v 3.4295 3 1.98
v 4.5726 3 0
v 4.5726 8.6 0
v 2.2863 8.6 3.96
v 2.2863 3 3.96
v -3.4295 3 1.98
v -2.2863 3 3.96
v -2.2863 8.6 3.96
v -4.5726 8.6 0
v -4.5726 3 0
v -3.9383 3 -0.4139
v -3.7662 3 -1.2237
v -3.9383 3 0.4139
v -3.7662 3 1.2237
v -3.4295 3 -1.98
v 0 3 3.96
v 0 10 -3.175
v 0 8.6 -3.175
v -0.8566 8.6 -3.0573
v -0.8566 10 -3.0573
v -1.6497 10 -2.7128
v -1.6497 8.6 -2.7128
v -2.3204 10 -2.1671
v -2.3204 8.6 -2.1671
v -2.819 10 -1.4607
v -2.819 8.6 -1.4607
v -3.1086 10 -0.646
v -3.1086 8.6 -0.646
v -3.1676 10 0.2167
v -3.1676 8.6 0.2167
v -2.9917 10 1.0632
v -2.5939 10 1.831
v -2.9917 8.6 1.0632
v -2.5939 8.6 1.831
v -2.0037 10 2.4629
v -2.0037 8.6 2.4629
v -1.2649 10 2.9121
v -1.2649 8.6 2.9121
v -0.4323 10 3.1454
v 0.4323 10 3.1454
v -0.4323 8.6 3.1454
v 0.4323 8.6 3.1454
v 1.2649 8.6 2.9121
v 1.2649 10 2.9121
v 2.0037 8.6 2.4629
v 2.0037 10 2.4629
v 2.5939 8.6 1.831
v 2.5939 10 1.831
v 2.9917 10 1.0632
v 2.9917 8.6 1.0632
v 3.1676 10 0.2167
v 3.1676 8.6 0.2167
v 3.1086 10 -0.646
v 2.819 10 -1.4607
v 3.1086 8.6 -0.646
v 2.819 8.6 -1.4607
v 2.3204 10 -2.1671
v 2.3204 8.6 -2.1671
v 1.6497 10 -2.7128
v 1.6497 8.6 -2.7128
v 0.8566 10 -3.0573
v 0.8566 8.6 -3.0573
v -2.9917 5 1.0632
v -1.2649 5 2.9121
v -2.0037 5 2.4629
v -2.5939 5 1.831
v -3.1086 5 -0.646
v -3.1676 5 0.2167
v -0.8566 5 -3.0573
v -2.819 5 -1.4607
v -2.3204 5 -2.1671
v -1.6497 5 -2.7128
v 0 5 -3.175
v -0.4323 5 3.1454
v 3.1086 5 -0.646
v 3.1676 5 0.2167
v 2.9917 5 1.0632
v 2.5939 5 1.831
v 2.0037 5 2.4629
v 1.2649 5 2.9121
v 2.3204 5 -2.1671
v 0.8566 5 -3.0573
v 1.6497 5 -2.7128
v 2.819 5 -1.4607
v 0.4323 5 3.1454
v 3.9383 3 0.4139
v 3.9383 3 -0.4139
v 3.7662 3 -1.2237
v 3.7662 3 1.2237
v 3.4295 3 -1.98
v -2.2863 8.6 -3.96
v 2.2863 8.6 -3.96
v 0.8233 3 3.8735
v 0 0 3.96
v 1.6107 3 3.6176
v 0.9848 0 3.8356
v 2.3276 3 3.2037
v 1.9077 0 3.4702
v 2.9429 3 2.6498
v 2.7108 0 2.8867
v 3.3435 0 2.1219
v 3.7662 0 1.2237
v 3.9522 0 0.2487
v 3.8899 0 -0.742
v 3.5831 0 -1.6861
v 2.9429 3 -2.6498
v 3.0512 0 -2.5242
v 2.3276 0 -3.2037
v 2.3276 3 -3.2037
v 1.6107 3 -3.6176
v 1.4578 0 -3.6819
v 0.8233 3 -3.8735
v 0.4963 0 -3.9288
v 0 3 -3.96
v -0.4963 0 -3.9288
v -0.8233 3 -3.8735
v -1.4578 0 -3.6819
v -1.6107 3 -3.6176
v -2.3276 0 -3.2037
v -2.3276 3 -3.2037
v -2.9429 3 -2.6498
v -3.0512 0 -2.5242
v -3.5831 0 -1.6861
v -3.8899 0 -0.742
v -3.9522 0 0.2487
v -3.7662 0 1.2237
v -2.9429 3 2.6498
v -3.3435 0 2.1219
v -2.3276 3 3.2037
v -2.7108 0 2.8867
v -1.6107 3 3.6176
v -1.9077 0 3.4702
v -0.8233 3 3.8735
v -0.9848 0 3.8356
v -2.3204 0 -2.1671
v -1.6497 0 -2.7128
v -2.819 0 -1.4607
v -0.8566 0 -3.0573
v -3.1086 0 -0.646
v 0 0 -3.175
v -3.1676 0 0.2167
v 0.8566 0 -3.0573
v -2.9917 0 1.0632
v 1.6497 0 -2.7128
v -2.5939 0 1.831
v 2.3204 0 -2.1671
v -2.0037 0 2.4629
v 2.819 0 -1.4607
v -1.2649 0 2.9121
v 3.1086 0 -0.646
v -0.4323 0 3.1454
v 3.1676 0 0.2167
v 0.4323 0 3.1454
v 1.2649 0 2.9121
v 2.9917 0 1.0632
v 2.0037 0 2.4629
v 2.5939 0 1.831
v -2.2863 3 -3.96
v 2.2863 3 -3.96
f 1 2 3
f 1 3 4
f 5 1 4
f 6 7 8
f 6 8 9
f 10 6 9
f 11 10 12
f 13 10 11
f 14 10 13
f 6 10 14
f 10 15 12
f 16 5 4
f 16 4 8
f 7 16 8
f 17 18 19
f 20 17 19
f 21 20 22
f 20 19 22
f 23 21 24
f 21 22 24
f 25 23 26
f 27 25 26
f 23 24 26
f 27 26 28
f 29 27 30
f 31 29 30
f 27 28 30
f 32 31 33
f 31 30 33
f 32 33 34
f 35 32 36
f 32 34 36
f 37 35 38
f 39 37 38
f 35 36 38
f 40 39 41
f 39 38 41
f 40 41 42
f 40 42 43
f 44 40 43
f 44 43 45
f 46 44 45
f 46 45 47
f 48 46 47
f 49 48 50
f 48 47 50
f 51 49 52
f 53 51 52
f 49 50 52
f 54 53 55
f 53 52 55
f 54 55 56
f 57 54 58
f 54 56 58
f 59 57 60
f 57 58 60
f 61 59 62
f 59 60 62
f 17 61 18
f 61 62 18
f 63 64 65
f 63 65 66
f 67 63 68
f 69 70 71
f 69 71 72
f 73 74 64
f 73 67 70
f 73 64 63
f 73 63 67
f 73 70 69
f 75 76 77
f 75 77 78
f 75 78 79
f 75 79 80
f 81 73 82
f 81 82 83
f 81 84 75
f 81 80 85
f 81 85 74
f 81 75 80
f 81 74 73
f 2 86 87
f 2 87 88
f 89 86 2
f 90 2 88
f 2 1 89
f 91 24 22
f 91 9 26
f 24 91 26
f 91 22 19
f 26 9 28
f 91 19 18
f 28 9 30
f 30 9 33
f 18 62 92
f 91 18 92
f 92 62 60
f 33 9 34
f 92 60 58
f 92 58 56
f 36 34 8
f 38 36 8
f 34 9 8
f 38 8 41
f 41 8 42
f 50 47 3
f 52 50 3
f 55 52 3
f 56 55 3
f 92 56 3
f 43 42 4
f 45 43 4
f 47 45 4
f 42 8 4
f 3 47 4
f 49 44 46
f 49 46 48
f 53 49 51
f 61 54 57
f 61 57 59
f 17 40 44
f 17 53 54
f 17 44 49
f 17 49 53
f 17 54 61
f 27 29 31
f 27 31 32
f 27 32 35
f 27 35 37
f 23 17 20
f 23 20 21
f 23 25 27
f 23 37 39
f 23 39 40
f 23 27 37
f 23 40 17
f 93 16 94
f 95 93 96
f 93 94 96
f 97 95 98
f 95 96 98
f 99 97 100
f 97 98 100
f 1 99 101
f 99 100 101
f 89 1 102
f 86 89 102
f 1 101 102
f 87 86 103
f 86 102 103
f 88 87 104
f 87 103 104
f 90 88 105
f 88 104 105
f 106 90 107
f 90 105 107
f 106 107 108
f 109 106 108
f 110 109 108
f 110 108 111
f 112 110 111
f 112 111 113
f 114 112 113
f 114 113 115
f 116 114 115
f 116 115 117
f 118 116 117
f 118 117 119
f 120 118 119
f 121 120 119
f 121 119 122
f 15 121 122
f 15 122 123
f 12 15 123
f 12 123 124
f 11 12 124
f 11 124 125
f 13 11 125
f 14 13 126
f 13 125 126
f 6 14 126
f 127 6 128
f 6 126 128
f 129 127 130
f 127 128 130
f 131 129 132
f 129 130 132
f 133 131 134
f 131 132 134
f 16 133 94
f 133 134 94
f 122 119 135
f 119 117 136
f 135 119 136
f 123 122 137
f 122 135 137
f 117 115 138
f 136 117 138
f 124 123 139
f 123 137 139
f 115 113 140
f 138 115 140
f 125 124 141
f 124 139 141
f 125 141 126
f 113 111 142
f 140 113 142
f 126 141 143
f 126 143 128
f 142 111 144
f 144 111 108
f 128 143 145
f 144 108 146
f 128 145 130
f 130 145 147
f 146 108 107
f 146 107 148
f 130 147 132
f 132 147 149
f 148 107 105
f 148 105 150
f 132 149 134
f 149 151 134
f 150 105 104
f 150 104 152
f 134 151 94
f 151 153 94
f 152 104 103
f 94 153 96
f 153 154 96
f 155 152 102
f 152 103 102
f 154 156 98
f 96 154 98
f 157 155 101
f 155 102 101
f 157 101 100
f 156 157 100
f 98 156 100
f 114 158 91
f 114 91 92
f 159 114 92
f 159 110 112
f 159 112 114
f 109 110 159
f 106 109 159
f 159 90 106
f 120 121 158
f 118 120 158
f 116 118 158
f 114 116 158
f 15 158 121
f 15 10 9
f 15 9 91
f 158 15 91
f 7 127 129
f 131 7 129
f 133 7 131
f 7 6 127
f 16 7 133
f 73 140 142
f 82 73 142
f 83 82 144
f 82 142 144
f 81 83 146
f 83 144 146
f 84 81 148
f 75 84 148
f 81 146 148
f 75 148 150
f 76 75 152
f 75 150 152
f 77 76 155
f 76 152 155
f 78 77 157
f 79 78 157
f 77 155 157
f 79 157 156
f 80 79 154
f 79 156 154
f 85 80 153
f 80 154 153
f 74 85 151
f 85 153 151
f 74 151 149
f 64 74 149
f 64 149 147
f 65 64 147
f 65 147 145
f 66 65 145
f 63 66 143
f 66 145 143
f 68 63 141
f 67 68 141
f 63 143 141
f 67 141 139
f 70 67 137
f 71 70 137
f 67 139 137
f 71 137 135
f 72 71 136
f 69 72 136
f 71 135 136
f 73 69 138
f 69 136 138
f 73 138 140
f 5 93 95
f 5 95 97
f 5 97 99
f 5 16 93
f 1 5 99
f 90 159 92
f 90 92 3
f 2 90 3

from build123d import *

# Parameters (mm, degrees)
SKETCH5_R           = 3.96
BOSS_EXTRUDE5_DEPTH = 3
BOSS_EXTRUDE7_DEPTH = 5.6
SKETCH7_R           = 3.175
CUT_EXTRUDE1_DEPTH  = 5
SKETCH8_R           = 3.175
BOSS_EXTRUDE9_DEPTH = 1.4


with BuildPart() as part:
    # Sketch5 → Boss-Extrude5 (new body)
    with BuildSketch(Plane(origin=(0, 0, 0), x_dir=(-1, 0, 0), z_dir=(0, 1, 0))):
        with Locations(Location((0, 0, 0), (0, 0, 90))):
            Circle(SKETCH5_R)
    extrude(amount=BOSS_EXTRUDE5_DEPTH)

    # Sketch6 → Boss-Extrude7 (add)
    with BuildSketch(Plane.XZ.offset(-3)):
        Polygon((-4.572614132, 0), (-2.286307066, -3.96), (2.286307066, -3.96), (4.572614132, 0), (2.286307066, 3.96), (-2.286307066, 3.96), align=None)
    extrude(amount=-BOSS_EXTRUDE7_DEPTH)

    # Sketch7 → Cut-Extrude1 (cut)
    with BuildSketch(Plane.XZ):
        with Locations(Location((0, 0, 0), (0, 0, 270))):
            Circle(SKETCH7_R)
    extrude(amount=-CUT_EXTRUDE1_DEPTH, mode=Mode.SUBTRACT)

    # Sketch8 → Boss-Extrude9 (add)
    with BuildSketch(Plane(origin=(0, 8.6, 0), x_dir=(1, 0, 0), z_dir=(0, 1, 0))):
        with Locations(Location((0, 0, 0), (0, 0, 90))):
            Circle(SKETCH8_R)
    extrude(amount=BOSS_EXTRUDE9_DEPTH)


solid = part.part
